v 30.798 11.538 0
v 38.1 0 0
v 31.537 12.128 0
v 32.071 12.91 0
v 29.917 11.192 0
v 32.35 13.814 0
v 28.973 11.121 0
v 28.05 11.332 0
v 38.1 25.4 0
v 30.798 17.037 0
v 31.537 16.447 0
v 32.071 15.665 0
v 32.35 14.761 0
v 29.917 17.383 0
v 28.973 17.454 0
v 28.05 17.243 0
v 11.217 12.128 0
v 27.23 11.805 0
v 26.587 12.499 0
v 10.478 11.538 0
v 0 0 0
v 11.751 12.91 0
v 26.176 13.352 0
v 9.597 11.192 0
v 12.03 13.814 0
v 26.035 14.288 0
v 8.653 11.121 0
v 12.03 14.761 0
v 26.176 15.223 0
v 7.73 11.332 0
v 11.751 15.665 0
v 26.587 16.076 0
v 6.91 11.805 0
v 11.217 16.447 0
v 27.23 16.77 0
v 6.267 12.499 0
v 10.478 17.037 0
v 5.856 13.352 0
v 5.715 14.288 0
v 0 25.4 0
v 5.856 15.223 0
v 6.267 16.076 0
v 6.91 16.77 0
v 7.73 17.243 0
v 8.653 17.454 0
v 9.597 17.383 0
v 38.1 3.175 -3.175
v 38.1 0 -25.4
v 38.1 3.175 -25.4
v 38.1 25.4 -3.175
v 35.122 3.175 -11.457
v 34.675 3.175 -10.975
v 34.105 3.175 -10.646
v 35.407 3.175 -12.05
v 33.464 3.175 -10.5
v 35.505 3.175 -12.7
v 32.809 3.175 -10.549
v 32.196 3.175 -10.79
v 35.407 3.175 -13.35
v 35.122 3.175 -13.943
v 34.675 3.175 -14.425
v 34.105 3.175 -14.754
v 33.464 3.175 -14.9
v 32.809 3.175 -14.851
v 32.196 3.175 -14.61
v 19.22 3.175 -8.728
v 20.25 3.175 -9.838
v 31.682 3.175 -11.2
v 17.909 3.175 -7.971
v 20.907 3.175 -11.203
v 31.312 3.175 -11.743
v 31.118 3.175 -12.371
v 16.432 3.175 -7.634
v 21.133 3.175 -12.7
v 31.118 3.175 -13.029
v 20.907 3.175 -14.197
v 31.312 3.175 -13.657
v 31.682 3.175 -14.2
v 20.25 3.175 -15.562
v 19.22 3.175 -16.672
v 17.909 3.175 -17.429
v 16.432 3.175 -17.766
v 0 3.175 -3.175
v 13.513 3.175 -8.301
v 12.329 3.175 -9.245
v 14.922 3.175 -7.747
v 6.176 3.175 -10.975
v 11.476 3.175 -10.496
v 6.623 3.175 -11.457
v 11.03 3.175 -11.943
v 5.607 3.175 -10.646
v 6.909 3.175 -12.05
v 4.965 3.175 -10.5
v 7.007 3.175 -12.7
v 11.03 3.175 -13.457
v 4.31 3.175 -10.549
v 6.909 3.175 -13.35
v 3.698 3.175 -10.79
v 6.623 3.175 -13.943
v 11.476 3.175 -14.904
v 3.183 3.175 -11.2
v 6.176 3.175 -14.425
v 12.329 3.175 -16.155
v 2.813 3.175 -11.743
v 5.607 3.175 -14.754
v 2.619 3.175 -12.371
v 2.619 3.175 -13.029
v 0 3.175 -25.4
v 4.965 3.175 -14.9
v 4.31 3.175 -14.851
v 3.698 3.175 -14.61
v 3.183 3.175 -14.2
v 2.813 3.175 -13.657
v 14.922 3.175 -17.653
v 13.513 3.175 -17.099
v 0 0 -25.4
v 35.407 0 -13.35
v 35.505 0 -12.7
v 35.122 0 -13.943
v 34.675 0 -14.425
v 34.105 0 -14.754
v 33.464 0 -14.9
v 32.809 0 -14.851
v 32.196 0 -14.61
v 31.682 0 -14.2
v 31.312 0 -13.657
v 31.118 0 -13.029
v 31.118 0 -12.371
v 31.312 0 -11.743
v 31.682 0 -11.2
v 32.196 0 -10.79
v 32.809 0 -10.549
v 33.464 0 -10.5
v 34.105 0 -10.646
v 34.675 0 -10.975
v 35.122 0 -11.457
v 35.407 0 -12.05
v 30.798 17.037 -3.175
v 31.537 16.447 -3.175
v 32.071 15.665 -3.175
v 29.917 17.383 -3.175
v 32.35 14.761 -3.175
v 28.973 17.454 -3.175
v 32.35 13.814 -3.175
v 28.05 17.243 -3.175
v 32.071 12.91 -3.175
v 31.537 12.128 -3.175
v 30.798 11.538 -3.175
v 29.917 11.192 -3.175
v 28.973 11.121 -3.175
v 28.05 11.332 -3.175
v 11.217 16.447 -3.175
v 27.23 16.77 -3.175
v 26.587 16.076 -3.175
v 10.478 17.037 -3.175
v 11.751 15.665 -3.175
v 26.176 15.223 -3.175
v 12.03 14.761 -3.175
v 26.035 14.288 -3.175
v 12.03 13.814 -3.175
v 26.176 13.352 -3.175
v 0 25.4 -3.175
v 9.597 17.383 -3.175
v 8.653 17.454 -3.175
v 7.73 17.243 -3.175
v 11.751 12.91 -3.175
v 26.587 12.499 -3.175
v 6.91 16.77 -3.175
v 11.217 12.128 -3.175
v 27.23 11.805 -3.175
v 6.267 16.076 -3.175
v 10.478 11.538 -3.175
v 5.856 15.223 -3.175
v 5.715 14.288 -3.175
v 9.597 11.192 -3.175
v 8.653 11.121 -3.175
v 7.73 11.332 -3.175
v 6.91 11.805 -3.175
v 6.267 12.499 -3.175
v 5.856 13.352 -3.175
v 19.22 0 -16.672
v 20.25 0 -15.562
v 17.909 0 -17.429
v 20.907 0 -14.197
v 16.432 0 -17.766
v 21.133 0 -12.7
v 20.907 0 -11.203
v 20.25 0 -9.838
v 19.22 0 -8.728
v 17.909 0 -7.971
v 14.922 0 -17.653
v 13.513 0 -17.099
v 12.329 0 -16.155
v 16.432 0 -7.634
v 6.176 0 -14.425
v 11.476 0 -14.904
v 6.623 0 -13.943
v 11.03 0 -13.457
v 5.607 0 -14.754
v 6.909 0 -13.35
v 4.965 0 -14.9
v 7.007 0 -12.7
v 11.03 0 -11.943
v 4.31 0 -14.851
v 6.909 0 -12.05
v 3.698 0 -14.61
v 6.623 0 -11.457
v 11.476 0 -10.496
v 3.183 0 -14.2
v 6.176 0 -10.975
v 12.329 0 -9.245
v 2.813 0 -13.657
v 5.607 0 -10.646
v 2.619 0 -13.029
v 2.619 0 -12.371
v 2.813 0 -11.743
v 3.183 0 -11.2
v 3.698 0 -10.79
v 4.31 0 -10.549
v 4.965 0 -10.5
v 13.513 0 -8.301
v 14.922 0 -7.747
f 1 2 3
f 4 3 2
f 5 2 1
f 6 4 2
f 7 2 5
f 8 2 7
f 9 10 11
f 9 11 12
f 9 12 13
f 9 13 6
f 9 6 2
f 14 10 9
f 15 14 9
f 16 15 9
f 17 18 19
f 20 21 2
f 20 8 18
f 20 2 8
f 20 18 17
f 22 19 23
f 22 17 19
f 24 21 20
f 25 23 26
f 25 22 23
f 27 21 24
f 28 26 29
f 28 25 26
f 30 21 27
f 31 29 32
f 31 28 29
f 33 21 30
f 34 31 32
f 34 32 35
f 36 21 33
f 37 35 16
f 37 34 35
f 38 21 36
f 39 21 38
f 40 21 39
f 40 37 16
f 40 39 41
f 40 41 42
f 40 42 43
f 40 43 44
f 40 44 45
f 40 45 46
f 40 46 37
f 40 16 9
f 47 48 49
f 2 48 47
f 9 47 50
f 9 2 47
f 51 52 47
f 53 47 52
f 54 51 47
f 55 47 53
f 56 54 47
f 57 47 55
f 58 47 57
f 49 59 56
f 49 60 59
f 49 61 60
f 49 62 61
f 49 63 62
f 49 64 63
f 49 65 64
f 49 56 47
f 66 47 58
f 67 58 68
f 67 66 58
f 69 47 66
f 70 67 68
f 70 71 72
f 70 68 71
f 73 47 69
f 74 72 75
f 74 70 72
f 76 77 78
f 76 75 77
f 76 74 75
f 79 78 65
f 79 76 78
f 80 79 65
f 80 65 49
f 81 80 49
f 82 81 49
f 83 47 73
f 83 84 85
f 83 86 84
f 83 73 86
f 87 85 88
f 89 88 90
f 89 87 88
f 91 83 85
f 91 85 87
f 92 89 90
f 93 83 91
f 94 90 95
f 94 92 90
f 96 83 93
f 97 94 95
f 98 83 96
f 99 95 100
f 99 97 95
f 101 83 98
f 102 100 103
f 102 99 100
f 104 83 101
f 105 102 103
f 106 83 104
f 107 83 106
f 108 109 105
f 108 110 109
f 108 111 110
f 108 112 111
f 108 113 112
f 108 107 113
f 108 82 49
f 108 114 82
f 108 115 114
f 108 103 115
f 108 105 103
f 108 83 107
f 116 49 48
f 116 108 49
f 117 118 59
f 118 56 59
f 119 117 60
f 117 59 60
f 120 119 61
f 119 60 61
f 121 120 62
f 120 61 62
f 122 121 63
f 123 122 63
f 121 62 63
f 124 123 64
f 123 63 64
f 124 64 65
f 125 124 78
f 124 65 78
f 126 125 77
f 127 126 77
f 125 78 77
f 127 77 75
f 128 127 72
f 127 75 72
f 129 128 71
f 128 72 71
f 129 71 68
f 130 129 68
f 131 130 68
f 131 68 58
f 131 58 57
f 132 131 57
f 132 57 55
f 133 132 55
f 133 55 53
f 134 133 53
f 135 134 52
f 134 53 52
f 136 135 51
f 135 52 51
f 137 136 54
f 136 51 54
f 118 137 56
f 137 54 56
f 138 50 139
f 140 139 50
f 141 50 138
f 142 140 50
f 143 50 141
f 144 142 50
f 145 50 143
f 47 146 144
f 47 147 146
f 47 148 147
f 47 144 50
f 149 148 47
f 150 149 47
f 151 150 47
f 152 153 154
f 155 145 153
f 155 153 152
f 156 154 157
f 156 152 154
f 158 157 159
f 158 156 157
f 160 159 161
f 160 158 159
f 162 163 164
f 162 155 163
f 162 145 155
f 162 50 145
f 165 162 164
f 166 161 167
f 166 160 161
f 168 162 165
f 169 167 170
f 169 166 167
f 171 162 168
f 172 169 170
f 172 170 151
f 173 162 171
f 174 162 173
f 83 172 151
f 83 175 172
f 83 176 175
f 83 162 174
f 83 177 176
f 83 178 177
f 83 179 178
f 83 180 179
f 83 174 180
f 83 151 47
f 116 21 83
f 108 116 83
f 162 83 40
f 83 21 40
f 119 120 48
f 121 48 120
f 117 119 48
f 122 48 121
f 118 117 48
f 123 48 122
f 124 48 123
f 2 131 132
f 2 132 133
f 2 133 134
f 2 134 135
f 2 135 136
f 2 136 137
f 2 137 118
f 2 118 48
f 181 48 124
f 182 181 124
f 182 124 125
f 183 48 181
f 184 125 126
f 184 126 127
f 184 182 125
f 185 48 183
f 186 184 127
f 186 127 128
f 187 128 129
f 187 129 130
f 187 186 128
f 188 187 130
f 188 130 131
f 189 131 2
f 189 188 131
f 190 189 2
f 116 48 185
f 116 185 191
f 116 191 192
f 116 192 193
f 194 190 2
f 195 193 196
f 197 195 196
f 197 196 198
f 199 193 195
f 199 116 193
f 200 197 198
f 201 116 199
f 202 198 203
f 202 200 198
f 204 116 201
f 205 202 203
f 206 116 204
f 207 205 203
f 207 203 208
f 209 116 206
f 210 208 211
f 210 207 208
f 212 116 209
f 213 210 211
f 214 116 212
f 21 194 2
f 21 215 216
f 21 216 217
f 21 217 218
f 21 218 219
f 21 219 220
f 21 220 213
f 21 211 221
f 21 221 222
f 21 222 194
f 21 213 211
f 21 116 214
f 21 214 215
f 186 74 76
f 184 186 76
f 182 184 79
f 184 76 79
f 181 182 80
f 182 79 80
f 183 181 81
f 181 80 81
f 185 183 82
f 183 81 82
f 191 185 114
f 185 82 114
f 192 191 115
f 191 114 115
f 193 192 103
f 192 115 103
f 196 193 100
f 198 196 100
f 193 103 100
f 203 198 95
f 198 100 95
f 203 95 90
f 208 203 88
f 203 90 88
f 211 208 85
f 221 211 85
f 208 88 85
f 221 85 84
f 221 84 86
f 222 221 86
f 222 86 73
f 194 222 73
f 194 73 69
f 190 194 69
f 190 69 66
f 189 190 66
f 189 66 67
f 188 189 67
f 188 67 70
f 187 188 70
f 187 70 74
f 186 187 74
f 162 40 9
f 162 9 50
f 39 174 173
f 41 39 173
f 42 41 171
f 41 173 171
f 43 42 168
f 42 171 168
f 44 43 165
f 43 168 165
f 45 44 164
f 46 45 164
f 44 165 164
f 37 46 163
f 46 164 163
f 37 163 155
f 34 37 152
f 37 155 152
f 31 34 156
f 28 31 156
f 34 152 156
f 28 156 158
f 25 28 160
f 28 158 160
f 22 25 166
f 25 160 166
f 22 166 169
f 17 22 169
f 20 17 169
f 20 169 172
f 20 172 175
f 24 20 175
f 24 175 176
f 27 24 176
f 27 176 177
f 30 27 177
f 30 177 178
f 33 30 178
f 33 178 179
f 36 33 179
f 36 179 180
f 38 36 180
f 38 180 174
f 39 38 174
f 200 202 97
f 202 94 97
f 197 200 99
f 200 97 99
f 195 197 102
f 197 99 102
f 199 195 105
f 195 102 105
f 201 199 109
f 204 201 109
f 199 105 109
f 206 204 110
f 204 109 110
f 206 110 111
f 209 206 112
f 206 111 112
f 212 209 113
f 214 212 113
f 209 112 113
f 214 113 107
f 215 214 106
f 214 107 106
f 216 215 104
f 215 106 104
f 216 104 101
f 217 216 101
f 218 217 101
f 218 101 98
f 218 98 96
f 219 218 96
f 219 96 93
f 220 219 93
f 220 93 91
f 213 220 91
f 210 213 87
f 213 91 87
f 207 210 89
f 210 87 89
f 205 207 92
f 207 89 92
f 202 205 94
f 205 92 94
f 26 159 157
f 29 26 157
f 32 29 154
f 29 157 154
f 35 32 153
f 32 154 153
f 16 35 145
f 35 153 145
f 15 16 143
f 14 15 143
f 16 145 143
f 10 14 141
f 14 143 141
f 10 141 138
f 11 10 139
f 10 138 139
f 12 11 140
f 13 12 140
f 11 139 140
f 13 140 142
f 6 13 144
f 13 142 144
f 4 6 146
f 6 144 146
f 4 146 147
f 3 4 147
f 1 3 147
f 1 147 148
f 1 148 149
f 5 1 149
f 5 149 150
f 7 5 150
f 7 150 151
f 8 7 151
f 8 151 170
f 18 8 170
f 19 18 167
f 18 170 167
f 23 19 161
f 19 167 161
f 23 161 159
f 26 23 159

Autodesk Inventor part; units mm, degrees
ref_plane "YZ Plane" through (0, 0, 0) normal (1, 0, 0) x (0, 1, 0)
ref_plane "XZ Plane" through (0, 0, 0) normal (0, 1, 0) x (-1, 0, 0)
ref_plane "XY Plane" through (0, 0, 0) normal (0, 0, 1) x (1, 0, 0)
sketch "Sketch1" plane through (0, 0, 0) normal (1, 0, 0) x (0, 1, 0)
  line L0 (0, 0) -> (25.4, 0)
  line L1 (25.4, 0) -> (25.4, -25.4)
  line L2 (25.4, -25.4) -> (0, -25.4)
  line L3 (0, -25.4) -> (0, 0)
  line L4 (0, -25.4) -> (3.175, -25.4)
  line L5 (25.4, 0) -> (25.4, -3.175)
  line L6 (25.4, -3.175) -> (3.175, -3.175)
  line L7 (3.175, -3.175) -> (3.175, -25.4)
  dimension "d0" = 25.4
  dimension "d1" = 25.4
  dimension "d2" = 3.175
  dimension "d3" = 3.175
extrude "Extrusion1" add sketch "Sketch1" along normal blind 38.1 contours L0 L1 L6 L7 L2 L3
sketch "Sketch2" plane through (0, 3.175, -3.175) normal (0, 1, 0) x (1, 0, 0)
  line L0 (0, -3.175) -> (0, 22.225) construction
  line L1 (0, 22.225) -> (0, -3.175) construction
  line L2 (0, 9.525) -> (38.1, 9.525) construction
  line L3 (38.1, -3.175) -> (38.1, 22.225) construction
  circle A0 centre (4.8006, 9.525) radius 2.206
  circle A1 centre (33.2994, 9.525) radius 2.206
  line L4 (33.2994, 9.525) -> (19.05, 9.525) construction
  line L5 (19.05, 9.525) -> (4.8006, 9.525) construction
  line L6 (4.8006, 9.525) -> (16.0528, 9.525) construction
  circle A2 centre (16.0528, 9.525) radius 5.08
  dimension "d6" = 25.4
  dimension "d7" = 14.2494
  dimension "d8" = 14.2494
  dimension "d11" = 4.412
  dimension "d12" = 4.412
  dimension "d13" = 11.2522
  dimension "d15" = 10.16
extrude "Extrusion2" cut sketch "Sketch2" against normal blind 38.1
sketch "Sketch3" plane through (0, 3.175, -3.175) normal (0, 0, -1) x (-1, 0, 0)
  line L0 (0, 22.225) -> (0, -3.175) construction
  line L1 (0, 22.225) -> (0, 0) construction
  line L2 (0, 11.1125) -> (-38.1, 11.1125) construction
  line L3 (-38.1, 0) -> (-38.1, 22.225) construction
  circle A0 centre (-29.21, 11.1125) radius 3.175
  circle A1 centre (-8.89, 11.1125) radius 3.175
  line L4 (-19.05, 11.1125) -> (-19.05, 13.4043) construction
  dimension "d16" = 22.225
  dimension "d17" = 10.16
  dimension "d18" = 10.16
  dimension "d19" = 6.35
  dimension "d20" = 6.35
extrude "Extrusion3" cut sketch "Sketch3" against normal blind 38.1
equation "\"d0\" = d1"
equation "\"d8\" = d7"
equation "\"d12\" = d11"
equation "\"d18\" = d17"
equation "\"d20\" = d19"
properties part number "bumper bracket"
